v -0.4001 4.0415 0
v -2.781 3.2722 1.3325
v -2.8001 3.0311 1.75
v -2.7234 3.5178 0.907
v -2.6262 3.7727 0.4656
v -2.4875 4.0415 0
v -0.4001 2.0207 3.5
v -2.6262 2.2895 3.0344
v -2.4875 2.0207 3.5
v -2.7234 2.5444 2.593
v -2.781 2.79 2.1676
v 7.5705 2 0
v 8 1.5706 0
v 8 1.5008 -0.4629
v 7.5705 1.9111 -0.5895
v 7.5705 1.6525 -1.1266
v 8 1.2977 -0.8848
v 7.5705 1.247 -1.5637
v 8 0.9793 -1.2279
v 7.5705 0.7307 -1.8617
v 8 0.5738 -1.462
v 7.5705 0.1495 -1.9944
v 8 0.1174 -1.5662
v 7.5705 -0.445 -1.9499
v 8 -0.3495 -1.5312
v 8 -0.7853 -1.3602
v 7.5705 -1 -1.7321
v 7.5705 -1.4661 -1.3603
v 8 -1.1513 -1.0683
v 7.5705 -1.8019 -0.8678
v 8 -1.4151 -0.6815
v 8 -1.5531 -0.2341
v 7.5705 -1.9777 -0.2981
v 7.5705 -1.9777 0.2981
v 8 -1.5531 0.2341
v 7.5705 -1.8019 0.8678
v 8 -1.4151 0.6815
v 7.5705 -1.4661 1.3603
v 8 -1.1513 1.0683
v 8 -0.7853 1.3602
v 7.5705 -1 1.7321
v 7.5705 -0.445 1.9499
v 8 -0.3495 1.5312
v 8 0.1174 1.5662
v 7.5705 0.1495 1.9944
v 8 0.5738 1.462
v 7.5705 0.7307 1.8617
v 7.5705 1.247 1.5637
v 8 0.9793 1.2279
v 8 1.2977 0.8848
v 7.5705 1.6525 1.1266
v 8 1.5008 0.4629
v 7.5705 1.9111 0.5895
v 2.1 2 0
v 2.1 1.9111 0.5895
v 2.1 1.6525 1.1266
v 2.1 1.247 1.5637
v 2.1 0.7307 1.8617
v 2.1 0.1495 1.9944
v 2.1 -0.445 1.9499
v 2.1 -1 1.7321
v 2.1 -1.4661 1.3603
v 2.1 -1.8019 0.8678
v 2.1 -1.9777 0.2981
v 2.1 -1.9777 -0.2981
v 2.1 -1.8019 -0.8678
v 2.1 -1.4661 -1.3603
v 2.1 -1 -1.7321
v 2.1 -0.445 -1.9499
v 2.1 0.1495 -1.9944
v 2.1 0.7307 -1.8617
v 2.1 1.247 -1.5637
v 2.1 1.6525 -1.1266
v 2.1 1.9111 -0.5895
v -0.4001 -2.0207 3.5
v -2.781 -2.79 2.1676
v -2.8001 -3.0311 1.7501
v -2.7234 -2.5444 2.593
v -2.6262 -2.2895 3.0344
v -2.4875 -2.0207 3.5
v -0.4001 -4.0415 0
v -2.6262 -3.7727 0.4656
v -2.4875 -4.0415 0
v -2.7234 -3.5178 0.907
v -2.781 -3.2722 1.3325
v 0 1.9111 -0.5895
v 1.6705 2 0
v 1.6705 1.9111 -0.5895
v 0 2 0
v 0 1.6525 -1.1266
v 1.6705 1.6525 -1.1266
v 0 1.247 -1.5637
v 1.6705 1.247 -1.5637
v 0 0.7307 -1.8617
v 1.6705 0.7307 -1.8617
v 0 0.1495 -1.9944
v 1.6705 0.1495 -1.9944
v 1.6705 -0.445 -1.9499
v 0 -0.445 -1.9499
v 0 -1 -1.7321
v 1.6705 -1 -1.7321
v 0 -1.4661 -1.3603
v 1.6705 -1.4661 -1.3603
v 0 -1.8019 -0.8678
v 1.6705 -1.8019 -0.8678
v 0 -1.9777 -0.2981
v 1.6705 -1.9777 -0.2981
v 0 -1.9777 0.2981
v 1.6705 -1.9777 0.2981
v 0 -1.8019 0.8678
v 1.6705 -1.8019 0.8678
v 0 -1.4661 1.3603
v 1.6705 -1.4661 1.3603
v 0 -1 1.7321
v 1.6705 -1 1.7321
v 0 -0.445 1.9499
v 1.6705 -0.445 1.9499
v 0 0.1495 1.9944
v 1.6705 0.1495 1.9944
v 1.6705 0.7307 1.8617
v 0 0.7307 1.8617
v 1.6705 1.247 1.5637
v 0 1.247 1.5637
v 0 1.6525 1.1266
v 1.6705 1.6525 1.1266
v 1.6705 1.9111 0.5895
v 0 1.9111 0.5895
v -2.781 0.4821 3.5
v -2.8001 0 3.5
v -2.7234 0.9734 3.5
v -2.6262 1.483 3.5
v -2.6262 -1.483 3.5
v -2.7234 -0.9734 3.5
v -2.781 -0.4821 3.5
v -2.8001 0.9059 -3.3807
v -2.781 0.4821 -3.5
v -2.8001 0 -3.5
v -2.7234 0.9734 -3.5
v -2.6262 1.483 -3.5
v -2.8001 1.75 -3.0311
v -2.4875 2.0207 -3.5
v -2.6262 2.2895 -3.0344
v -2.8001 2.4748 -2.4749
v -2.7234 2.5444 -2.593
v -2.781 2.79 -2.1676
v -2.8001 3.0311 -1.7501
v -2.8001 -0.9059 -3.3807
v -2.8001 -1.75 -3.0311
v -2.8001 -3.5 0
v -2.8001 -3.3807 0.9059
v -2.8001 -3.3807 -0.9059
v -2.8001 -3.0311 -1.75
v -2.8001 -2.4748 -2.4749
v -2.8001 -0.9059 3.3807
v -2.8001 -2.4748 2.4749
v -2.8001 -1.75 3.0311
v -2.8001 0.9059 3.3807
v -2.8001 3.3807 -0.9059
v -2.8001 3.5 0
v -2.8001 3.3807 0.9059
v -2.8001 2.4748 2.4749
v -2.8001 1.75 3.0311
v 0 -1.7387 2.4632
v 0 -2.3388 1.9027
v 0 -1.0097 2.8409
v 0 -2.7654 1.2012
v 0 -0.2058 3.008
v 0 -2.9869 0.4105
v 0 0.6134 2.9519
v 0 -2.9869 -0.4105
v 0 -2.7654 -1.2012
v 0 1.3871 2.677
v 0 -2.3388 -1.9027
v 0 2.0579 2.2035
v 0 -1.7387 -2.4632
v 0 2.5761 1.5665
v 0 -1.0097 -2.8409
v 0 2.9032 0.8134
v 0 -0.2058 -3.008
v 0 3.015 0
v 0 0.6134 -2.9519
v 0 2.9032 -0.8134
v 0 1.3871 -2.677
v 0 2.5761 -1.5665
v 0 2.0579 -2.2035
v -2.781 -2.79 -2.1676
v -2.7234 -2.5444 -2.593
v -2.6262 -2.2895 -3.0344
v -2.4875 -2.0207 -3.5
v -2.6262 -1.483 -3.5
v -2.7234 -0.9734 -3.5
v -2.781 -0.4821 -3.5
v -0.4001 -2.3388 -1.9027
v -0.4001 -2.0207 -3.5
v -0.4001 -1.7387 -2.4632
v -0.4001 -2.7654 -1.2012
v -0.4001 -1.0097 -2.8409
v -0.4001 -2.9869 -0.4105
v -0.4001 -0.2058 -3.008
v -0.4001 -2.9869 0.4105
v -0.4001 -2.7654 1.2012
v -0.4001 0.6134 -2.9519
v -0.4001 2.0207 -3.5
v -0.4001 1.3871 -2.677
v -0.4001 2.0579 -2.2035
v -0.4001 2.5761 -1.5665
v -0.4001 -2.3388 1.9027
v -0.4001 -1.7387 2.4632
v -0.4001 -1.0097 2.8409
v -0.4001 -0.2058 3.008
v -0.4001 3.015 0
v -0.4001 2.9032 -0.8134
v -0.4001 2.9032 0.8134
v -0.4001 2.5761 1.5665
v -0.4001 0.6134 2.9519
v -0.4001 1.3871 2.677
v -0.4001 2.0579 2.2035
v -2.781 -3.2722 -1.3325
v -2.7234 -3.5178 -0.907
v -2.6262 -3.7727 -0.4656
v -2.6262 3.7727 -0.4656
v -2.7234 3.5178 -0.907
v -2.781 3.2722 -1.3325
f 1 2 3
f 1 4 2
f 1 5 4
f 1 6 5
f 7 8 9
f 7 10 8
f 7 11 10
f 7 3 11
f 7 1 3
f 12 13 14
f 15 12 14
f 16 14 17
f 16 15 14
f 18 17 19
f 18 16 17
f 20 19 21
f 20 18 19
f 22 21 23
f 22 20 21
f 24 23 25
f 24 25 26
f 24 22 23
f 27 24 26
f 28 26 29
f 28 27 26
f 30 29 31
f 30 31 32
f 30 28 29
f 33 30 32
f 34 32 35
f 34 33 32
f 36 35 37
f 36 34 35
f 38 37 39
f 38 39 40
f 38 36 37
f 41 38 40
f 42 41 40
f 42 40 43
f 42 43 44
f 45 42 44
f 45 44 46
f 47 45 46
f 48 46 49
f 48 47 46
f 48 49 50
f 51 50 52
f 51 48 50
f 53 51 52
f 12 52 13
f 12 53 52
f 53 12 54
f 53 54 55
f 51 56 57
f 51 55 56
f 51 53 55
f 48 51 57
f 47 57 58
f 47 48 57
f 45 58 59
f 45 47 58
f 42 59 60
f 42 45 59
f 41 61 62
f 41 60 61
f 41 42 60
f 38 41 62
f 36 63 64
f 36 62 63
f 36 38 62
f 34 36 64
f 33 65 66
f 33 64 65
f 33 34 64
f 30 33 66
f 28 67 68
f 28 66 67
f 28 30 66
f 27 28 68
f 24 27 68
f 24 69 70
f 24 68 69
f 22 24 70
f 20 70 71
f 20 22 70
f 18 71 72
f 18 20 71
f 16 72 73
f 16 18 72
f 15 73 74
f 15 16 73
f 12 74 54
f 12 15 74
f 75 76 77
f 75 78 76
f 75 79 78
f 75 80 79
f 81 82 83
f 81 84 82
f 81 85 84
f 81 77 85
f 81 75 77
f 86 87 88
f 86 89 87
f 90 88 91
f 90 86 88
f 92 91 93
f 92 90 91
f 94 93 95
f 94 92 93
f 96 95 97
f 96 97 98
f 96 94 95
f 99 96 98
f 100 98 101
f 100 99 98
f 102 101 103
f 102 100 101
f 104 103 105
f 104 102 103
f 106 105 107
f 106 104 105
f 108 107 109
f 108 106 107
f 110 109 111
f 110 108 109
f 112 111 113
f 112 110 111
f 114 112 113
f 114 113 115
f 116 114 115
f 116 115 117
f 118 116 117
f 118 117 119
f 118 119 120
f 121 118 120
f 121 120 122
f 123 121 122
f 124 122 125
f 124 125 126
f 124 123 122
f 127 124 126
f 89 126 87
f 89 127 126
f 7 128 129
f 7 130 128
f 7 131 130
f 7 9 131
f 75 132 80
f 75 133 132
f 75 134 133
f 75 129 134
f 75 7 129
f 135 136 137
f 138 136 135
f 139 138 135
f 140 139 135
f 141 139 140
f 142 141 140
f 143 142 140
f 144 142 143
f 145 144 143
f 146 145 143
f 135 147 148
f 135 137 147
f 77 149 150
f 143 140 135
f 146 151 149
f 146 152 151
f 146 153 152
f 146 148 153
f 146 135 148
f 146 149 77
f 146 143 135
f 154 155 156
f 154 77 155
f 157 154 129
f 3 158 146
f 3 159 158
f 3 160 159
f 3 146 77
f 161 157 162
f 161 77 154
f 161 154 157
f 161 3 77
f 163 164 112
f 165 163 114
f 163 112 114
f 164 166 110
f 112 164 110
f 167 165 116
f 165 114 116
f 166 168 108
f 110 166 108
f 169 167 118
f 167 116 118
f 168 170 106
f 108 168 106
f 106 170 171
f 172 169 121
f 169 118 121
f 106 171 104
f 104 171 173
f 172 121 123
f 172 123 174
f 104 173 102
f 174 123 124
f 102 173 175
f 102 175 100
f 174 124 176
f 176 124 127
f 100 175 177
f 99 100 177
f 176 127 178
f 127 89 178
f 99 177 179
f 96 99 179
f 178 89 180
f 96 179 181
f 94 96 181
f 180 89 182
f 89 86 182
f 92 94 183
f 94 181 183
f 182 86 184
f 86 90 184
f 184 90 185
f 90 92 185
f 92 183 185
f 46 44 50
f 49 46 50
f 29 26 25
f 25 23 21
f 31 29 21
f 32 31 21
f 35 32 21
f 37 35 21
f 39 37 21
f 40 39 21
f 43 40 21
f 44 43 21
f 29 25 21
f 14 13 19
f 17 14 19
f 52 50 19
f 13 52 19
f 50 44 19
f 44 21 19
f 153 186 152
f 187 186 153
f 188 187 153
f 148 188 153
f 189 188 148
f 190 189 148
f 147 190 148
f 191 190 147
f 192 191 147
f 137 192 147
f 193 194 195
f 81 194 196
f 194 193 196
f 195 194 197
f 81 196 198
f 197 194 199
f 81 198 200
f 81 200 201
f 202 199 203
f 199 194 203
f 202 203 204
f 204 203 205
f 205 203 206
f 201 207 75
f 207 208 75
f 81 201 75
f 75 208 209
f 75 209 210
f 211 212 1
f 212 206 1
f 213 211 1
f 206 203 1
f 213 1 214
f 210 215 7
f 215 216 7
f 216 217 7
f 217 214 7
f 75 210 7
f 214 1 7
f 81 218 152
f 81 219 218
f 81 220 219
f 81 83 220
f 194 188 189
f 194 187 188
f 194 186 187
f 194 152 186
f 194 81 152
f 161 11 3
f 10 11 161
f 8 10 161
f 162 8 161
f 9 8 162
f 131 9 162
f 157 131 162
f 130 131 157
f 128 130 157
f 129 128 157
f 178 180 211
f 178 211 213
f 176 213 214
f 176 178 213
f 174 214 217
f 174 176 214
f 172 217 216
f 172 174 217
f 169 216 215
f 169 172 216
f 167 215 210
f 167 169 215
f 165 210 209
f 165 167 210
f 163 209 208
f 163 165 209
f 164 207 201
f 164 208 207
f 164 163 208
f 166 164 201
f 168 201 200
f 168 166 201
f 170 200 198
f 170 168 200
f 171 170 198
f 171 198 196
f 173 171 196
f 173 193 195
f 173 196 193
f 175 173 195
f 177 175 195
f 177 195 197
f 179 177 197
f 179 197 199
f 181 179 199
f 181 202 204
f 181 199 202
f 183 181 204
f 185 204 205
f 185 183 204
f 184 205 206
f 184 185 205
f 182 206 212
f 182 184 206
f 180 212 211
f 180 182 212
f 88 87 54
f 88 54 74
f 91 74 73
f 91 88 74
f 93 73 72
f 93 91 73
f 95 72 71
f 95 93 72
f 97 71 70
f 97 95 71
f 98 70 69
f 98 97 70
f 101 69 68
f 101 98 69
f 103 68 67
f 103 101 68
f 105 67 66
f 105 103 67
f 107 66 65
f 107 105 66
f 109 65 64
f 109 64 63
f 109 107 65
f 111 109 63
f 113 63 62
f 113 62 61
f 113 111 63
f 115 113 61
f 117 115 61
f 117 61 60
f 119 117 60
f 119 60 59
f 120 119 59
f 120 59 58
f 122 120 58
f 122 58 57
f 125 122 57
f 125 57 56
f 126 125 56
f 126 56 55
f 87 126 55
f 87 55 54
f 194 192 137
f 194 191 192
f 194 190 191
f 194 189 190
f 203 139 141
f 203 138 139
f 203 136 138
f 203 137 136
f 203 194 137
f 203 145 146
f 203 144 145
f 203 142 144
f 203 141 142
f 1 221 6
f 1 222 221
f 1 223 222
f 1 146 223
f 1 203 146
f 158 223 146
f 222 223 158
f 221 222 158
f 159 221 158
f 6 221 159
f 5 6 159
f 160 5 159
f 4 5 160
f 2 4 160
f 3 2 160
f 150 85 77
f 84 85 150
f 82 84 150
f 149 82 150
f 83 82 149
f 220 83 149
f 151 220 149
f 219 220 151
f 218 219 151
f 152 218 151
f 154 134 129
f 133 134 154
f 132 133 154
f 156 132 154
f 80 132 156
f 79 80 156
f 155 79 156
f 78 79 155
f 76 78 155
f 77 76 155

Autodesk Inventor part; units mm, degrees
ref_plane "YZ Plane" through (0, 0, 0) normal (1, 0, 0) x (0, 1, 0)
ref_plane "XZ Plane" through (0, 0, 0) normal (0, 1, 0) x (-1, 0, 0)
sketch "Boceto1" plane through (0, 0, 0) normal (0, 0, 1) x (1, 0, 0)
  line L0 (0, 3.015) -> (0, 2)
  line L1 (2.1, 2) -> (8, 2)
  line L2 (8, 2) -> (8, 0)
  line L3 (8, 0) -> (-0.4001, 0)
  line L4 (-2.0801, 0) -> (9.68, 0) projected
  line L5 (-0.4001, 0) -> (-0.4001, 3.015)
  line L6 (-0.4001, 3.015) -> (0, 3.015)
  line L7 (2.1, 2) -> (1.6705, 2)
  line L8 (1.6705, 2) -> (0, 2)
  line L9 (0, -0.603) -> (0, 3.618) projected
  dimension "d0" = 8
  dimension "d1" = 5.9
  dimension "d2" = 4
  dimension "d9" = 0.4001
  dimension "d10" = 6.03
  dimension "d13" = 0.4295
  dimension "d14" = 4
revolve "Cuerpo" add sketch "Boceto1" angle 360 about axis through (8, 0, 0) along (-1, 0, 0)
sketch "Boceto2" plane through (-0.4001, 0, 0) normal (-1, 0, 0) x (0, 0, 1)
  line L0 (0, 4.0415) -> (3.5, 2.0207)
  line L1 (3.5, 2.0207) -> (3.5, -2.0207)
  line L2 (3.5, -2.0207) -> (0, -4.0415)
  line L3 (0, -4.0415) -> (-3.5, -2.0207)
  line L4 (-3.5, -2.0207) -> (-3.5, 2.0207)
  line L5 (-3.5, 2.0207) -> (0, 4.0415)
  point P0 (0, 0)
  point P1 (0, 0)
  dimension "d11" = 7
extrude "Cabeza" add sketch "Boceto2" along normal blind 2.4
sketch "Boceto4" plane through (0, 0, 0) normal (0, 0, 1) x (1, 0, 0)
  line L0 (-2.8001, 3.5) -> (-2.8001, 4.0415)
  line L1 (-2.8001, 4.0415) -> (-2.4875, 4.0415)
  line L2 (-2.4875, 4.0415) -> (-2.8001, 3.5)
  line L3 (-3.2801, 0) -> (0.0799, 0) projected
  line L4 (-0.4001, 4.0415) -> (-2.8001, 4.0415) projected
  line L5 (-2.8001, 2.0207) -> (-2.8001, 4.0415) projected
  dimension "d5" = 30
  dimension "d19" = 7
revolve "Chaflán1" cut sketch "Boceto4" angle 360 about axis through (-10, 0, 0) along (1, 0, 0)
thread "Rosca" size "M4x0.7" class "6g" standard "ISO Metric profile" length 5.9
chamfer "Chaflán2" distance 0.4294 distance2 0.4295 1 edges at (8, -2, 0) measured on face at (8, 0.1822, 0.4036)
ref_plane "Work Plane1" through (1.525, 0, 0) normal (0, 0, 1) x (1, 0, 0)
equation "\"d0\" = NLG"
equation "\"d1\" = GEL"
equation "\"d2\" = GD"
equation "\"d10\" = SD2"
equation "\"d14\" = BDM"
equation "\"d11\" = SW"
equation "\"d3\" = KOH - SD"
equation "\"d5\" = ANG1"
equation "\"d19\" = SW0"
equation "\"d15\" = GEL"
equation "\"d6\" = -0.5 * SPD + 0.5 * GD"
equation "\"NLG\" = 8"
equation "\"GD\" = NND"
equation "\"BDM\" = NND"
equation "\"KOH\" = 2.8"
equation "\"GEL\" = 5.9"
equation "\"SW\" = 7"
equation "\"SW0\" = SW"
equation "\"SPD\" = NND - 1.2269 * PTC"
equation "\"SD2\" = 6.03"
equation "\"SD\" = 0.4"
equation "\"ANG1\" = 30deg"
equation "\"GAL\" = 0.61345 * PTC"
equation "\"GUL\" = 0.61345 * PTC"
equation "\"RR\" = 0.2"
equation "\"GD1\" = THREADDIA - 1.2269 * PTC"
equation "\"THREADDIA\" = 4"
equation "\"SDH\" = SD2"
equation "\"SDHG\" = 2.1"
equation "\"TOA\" = 30deg"
equation "\"PTC\" = 0.7"
equation "\"NND\" = 4"
equation "\"E0\" = 8.085"
properties part number "ISO 4017 - M4 x 8" material "Acero inoxidable, 440C"
